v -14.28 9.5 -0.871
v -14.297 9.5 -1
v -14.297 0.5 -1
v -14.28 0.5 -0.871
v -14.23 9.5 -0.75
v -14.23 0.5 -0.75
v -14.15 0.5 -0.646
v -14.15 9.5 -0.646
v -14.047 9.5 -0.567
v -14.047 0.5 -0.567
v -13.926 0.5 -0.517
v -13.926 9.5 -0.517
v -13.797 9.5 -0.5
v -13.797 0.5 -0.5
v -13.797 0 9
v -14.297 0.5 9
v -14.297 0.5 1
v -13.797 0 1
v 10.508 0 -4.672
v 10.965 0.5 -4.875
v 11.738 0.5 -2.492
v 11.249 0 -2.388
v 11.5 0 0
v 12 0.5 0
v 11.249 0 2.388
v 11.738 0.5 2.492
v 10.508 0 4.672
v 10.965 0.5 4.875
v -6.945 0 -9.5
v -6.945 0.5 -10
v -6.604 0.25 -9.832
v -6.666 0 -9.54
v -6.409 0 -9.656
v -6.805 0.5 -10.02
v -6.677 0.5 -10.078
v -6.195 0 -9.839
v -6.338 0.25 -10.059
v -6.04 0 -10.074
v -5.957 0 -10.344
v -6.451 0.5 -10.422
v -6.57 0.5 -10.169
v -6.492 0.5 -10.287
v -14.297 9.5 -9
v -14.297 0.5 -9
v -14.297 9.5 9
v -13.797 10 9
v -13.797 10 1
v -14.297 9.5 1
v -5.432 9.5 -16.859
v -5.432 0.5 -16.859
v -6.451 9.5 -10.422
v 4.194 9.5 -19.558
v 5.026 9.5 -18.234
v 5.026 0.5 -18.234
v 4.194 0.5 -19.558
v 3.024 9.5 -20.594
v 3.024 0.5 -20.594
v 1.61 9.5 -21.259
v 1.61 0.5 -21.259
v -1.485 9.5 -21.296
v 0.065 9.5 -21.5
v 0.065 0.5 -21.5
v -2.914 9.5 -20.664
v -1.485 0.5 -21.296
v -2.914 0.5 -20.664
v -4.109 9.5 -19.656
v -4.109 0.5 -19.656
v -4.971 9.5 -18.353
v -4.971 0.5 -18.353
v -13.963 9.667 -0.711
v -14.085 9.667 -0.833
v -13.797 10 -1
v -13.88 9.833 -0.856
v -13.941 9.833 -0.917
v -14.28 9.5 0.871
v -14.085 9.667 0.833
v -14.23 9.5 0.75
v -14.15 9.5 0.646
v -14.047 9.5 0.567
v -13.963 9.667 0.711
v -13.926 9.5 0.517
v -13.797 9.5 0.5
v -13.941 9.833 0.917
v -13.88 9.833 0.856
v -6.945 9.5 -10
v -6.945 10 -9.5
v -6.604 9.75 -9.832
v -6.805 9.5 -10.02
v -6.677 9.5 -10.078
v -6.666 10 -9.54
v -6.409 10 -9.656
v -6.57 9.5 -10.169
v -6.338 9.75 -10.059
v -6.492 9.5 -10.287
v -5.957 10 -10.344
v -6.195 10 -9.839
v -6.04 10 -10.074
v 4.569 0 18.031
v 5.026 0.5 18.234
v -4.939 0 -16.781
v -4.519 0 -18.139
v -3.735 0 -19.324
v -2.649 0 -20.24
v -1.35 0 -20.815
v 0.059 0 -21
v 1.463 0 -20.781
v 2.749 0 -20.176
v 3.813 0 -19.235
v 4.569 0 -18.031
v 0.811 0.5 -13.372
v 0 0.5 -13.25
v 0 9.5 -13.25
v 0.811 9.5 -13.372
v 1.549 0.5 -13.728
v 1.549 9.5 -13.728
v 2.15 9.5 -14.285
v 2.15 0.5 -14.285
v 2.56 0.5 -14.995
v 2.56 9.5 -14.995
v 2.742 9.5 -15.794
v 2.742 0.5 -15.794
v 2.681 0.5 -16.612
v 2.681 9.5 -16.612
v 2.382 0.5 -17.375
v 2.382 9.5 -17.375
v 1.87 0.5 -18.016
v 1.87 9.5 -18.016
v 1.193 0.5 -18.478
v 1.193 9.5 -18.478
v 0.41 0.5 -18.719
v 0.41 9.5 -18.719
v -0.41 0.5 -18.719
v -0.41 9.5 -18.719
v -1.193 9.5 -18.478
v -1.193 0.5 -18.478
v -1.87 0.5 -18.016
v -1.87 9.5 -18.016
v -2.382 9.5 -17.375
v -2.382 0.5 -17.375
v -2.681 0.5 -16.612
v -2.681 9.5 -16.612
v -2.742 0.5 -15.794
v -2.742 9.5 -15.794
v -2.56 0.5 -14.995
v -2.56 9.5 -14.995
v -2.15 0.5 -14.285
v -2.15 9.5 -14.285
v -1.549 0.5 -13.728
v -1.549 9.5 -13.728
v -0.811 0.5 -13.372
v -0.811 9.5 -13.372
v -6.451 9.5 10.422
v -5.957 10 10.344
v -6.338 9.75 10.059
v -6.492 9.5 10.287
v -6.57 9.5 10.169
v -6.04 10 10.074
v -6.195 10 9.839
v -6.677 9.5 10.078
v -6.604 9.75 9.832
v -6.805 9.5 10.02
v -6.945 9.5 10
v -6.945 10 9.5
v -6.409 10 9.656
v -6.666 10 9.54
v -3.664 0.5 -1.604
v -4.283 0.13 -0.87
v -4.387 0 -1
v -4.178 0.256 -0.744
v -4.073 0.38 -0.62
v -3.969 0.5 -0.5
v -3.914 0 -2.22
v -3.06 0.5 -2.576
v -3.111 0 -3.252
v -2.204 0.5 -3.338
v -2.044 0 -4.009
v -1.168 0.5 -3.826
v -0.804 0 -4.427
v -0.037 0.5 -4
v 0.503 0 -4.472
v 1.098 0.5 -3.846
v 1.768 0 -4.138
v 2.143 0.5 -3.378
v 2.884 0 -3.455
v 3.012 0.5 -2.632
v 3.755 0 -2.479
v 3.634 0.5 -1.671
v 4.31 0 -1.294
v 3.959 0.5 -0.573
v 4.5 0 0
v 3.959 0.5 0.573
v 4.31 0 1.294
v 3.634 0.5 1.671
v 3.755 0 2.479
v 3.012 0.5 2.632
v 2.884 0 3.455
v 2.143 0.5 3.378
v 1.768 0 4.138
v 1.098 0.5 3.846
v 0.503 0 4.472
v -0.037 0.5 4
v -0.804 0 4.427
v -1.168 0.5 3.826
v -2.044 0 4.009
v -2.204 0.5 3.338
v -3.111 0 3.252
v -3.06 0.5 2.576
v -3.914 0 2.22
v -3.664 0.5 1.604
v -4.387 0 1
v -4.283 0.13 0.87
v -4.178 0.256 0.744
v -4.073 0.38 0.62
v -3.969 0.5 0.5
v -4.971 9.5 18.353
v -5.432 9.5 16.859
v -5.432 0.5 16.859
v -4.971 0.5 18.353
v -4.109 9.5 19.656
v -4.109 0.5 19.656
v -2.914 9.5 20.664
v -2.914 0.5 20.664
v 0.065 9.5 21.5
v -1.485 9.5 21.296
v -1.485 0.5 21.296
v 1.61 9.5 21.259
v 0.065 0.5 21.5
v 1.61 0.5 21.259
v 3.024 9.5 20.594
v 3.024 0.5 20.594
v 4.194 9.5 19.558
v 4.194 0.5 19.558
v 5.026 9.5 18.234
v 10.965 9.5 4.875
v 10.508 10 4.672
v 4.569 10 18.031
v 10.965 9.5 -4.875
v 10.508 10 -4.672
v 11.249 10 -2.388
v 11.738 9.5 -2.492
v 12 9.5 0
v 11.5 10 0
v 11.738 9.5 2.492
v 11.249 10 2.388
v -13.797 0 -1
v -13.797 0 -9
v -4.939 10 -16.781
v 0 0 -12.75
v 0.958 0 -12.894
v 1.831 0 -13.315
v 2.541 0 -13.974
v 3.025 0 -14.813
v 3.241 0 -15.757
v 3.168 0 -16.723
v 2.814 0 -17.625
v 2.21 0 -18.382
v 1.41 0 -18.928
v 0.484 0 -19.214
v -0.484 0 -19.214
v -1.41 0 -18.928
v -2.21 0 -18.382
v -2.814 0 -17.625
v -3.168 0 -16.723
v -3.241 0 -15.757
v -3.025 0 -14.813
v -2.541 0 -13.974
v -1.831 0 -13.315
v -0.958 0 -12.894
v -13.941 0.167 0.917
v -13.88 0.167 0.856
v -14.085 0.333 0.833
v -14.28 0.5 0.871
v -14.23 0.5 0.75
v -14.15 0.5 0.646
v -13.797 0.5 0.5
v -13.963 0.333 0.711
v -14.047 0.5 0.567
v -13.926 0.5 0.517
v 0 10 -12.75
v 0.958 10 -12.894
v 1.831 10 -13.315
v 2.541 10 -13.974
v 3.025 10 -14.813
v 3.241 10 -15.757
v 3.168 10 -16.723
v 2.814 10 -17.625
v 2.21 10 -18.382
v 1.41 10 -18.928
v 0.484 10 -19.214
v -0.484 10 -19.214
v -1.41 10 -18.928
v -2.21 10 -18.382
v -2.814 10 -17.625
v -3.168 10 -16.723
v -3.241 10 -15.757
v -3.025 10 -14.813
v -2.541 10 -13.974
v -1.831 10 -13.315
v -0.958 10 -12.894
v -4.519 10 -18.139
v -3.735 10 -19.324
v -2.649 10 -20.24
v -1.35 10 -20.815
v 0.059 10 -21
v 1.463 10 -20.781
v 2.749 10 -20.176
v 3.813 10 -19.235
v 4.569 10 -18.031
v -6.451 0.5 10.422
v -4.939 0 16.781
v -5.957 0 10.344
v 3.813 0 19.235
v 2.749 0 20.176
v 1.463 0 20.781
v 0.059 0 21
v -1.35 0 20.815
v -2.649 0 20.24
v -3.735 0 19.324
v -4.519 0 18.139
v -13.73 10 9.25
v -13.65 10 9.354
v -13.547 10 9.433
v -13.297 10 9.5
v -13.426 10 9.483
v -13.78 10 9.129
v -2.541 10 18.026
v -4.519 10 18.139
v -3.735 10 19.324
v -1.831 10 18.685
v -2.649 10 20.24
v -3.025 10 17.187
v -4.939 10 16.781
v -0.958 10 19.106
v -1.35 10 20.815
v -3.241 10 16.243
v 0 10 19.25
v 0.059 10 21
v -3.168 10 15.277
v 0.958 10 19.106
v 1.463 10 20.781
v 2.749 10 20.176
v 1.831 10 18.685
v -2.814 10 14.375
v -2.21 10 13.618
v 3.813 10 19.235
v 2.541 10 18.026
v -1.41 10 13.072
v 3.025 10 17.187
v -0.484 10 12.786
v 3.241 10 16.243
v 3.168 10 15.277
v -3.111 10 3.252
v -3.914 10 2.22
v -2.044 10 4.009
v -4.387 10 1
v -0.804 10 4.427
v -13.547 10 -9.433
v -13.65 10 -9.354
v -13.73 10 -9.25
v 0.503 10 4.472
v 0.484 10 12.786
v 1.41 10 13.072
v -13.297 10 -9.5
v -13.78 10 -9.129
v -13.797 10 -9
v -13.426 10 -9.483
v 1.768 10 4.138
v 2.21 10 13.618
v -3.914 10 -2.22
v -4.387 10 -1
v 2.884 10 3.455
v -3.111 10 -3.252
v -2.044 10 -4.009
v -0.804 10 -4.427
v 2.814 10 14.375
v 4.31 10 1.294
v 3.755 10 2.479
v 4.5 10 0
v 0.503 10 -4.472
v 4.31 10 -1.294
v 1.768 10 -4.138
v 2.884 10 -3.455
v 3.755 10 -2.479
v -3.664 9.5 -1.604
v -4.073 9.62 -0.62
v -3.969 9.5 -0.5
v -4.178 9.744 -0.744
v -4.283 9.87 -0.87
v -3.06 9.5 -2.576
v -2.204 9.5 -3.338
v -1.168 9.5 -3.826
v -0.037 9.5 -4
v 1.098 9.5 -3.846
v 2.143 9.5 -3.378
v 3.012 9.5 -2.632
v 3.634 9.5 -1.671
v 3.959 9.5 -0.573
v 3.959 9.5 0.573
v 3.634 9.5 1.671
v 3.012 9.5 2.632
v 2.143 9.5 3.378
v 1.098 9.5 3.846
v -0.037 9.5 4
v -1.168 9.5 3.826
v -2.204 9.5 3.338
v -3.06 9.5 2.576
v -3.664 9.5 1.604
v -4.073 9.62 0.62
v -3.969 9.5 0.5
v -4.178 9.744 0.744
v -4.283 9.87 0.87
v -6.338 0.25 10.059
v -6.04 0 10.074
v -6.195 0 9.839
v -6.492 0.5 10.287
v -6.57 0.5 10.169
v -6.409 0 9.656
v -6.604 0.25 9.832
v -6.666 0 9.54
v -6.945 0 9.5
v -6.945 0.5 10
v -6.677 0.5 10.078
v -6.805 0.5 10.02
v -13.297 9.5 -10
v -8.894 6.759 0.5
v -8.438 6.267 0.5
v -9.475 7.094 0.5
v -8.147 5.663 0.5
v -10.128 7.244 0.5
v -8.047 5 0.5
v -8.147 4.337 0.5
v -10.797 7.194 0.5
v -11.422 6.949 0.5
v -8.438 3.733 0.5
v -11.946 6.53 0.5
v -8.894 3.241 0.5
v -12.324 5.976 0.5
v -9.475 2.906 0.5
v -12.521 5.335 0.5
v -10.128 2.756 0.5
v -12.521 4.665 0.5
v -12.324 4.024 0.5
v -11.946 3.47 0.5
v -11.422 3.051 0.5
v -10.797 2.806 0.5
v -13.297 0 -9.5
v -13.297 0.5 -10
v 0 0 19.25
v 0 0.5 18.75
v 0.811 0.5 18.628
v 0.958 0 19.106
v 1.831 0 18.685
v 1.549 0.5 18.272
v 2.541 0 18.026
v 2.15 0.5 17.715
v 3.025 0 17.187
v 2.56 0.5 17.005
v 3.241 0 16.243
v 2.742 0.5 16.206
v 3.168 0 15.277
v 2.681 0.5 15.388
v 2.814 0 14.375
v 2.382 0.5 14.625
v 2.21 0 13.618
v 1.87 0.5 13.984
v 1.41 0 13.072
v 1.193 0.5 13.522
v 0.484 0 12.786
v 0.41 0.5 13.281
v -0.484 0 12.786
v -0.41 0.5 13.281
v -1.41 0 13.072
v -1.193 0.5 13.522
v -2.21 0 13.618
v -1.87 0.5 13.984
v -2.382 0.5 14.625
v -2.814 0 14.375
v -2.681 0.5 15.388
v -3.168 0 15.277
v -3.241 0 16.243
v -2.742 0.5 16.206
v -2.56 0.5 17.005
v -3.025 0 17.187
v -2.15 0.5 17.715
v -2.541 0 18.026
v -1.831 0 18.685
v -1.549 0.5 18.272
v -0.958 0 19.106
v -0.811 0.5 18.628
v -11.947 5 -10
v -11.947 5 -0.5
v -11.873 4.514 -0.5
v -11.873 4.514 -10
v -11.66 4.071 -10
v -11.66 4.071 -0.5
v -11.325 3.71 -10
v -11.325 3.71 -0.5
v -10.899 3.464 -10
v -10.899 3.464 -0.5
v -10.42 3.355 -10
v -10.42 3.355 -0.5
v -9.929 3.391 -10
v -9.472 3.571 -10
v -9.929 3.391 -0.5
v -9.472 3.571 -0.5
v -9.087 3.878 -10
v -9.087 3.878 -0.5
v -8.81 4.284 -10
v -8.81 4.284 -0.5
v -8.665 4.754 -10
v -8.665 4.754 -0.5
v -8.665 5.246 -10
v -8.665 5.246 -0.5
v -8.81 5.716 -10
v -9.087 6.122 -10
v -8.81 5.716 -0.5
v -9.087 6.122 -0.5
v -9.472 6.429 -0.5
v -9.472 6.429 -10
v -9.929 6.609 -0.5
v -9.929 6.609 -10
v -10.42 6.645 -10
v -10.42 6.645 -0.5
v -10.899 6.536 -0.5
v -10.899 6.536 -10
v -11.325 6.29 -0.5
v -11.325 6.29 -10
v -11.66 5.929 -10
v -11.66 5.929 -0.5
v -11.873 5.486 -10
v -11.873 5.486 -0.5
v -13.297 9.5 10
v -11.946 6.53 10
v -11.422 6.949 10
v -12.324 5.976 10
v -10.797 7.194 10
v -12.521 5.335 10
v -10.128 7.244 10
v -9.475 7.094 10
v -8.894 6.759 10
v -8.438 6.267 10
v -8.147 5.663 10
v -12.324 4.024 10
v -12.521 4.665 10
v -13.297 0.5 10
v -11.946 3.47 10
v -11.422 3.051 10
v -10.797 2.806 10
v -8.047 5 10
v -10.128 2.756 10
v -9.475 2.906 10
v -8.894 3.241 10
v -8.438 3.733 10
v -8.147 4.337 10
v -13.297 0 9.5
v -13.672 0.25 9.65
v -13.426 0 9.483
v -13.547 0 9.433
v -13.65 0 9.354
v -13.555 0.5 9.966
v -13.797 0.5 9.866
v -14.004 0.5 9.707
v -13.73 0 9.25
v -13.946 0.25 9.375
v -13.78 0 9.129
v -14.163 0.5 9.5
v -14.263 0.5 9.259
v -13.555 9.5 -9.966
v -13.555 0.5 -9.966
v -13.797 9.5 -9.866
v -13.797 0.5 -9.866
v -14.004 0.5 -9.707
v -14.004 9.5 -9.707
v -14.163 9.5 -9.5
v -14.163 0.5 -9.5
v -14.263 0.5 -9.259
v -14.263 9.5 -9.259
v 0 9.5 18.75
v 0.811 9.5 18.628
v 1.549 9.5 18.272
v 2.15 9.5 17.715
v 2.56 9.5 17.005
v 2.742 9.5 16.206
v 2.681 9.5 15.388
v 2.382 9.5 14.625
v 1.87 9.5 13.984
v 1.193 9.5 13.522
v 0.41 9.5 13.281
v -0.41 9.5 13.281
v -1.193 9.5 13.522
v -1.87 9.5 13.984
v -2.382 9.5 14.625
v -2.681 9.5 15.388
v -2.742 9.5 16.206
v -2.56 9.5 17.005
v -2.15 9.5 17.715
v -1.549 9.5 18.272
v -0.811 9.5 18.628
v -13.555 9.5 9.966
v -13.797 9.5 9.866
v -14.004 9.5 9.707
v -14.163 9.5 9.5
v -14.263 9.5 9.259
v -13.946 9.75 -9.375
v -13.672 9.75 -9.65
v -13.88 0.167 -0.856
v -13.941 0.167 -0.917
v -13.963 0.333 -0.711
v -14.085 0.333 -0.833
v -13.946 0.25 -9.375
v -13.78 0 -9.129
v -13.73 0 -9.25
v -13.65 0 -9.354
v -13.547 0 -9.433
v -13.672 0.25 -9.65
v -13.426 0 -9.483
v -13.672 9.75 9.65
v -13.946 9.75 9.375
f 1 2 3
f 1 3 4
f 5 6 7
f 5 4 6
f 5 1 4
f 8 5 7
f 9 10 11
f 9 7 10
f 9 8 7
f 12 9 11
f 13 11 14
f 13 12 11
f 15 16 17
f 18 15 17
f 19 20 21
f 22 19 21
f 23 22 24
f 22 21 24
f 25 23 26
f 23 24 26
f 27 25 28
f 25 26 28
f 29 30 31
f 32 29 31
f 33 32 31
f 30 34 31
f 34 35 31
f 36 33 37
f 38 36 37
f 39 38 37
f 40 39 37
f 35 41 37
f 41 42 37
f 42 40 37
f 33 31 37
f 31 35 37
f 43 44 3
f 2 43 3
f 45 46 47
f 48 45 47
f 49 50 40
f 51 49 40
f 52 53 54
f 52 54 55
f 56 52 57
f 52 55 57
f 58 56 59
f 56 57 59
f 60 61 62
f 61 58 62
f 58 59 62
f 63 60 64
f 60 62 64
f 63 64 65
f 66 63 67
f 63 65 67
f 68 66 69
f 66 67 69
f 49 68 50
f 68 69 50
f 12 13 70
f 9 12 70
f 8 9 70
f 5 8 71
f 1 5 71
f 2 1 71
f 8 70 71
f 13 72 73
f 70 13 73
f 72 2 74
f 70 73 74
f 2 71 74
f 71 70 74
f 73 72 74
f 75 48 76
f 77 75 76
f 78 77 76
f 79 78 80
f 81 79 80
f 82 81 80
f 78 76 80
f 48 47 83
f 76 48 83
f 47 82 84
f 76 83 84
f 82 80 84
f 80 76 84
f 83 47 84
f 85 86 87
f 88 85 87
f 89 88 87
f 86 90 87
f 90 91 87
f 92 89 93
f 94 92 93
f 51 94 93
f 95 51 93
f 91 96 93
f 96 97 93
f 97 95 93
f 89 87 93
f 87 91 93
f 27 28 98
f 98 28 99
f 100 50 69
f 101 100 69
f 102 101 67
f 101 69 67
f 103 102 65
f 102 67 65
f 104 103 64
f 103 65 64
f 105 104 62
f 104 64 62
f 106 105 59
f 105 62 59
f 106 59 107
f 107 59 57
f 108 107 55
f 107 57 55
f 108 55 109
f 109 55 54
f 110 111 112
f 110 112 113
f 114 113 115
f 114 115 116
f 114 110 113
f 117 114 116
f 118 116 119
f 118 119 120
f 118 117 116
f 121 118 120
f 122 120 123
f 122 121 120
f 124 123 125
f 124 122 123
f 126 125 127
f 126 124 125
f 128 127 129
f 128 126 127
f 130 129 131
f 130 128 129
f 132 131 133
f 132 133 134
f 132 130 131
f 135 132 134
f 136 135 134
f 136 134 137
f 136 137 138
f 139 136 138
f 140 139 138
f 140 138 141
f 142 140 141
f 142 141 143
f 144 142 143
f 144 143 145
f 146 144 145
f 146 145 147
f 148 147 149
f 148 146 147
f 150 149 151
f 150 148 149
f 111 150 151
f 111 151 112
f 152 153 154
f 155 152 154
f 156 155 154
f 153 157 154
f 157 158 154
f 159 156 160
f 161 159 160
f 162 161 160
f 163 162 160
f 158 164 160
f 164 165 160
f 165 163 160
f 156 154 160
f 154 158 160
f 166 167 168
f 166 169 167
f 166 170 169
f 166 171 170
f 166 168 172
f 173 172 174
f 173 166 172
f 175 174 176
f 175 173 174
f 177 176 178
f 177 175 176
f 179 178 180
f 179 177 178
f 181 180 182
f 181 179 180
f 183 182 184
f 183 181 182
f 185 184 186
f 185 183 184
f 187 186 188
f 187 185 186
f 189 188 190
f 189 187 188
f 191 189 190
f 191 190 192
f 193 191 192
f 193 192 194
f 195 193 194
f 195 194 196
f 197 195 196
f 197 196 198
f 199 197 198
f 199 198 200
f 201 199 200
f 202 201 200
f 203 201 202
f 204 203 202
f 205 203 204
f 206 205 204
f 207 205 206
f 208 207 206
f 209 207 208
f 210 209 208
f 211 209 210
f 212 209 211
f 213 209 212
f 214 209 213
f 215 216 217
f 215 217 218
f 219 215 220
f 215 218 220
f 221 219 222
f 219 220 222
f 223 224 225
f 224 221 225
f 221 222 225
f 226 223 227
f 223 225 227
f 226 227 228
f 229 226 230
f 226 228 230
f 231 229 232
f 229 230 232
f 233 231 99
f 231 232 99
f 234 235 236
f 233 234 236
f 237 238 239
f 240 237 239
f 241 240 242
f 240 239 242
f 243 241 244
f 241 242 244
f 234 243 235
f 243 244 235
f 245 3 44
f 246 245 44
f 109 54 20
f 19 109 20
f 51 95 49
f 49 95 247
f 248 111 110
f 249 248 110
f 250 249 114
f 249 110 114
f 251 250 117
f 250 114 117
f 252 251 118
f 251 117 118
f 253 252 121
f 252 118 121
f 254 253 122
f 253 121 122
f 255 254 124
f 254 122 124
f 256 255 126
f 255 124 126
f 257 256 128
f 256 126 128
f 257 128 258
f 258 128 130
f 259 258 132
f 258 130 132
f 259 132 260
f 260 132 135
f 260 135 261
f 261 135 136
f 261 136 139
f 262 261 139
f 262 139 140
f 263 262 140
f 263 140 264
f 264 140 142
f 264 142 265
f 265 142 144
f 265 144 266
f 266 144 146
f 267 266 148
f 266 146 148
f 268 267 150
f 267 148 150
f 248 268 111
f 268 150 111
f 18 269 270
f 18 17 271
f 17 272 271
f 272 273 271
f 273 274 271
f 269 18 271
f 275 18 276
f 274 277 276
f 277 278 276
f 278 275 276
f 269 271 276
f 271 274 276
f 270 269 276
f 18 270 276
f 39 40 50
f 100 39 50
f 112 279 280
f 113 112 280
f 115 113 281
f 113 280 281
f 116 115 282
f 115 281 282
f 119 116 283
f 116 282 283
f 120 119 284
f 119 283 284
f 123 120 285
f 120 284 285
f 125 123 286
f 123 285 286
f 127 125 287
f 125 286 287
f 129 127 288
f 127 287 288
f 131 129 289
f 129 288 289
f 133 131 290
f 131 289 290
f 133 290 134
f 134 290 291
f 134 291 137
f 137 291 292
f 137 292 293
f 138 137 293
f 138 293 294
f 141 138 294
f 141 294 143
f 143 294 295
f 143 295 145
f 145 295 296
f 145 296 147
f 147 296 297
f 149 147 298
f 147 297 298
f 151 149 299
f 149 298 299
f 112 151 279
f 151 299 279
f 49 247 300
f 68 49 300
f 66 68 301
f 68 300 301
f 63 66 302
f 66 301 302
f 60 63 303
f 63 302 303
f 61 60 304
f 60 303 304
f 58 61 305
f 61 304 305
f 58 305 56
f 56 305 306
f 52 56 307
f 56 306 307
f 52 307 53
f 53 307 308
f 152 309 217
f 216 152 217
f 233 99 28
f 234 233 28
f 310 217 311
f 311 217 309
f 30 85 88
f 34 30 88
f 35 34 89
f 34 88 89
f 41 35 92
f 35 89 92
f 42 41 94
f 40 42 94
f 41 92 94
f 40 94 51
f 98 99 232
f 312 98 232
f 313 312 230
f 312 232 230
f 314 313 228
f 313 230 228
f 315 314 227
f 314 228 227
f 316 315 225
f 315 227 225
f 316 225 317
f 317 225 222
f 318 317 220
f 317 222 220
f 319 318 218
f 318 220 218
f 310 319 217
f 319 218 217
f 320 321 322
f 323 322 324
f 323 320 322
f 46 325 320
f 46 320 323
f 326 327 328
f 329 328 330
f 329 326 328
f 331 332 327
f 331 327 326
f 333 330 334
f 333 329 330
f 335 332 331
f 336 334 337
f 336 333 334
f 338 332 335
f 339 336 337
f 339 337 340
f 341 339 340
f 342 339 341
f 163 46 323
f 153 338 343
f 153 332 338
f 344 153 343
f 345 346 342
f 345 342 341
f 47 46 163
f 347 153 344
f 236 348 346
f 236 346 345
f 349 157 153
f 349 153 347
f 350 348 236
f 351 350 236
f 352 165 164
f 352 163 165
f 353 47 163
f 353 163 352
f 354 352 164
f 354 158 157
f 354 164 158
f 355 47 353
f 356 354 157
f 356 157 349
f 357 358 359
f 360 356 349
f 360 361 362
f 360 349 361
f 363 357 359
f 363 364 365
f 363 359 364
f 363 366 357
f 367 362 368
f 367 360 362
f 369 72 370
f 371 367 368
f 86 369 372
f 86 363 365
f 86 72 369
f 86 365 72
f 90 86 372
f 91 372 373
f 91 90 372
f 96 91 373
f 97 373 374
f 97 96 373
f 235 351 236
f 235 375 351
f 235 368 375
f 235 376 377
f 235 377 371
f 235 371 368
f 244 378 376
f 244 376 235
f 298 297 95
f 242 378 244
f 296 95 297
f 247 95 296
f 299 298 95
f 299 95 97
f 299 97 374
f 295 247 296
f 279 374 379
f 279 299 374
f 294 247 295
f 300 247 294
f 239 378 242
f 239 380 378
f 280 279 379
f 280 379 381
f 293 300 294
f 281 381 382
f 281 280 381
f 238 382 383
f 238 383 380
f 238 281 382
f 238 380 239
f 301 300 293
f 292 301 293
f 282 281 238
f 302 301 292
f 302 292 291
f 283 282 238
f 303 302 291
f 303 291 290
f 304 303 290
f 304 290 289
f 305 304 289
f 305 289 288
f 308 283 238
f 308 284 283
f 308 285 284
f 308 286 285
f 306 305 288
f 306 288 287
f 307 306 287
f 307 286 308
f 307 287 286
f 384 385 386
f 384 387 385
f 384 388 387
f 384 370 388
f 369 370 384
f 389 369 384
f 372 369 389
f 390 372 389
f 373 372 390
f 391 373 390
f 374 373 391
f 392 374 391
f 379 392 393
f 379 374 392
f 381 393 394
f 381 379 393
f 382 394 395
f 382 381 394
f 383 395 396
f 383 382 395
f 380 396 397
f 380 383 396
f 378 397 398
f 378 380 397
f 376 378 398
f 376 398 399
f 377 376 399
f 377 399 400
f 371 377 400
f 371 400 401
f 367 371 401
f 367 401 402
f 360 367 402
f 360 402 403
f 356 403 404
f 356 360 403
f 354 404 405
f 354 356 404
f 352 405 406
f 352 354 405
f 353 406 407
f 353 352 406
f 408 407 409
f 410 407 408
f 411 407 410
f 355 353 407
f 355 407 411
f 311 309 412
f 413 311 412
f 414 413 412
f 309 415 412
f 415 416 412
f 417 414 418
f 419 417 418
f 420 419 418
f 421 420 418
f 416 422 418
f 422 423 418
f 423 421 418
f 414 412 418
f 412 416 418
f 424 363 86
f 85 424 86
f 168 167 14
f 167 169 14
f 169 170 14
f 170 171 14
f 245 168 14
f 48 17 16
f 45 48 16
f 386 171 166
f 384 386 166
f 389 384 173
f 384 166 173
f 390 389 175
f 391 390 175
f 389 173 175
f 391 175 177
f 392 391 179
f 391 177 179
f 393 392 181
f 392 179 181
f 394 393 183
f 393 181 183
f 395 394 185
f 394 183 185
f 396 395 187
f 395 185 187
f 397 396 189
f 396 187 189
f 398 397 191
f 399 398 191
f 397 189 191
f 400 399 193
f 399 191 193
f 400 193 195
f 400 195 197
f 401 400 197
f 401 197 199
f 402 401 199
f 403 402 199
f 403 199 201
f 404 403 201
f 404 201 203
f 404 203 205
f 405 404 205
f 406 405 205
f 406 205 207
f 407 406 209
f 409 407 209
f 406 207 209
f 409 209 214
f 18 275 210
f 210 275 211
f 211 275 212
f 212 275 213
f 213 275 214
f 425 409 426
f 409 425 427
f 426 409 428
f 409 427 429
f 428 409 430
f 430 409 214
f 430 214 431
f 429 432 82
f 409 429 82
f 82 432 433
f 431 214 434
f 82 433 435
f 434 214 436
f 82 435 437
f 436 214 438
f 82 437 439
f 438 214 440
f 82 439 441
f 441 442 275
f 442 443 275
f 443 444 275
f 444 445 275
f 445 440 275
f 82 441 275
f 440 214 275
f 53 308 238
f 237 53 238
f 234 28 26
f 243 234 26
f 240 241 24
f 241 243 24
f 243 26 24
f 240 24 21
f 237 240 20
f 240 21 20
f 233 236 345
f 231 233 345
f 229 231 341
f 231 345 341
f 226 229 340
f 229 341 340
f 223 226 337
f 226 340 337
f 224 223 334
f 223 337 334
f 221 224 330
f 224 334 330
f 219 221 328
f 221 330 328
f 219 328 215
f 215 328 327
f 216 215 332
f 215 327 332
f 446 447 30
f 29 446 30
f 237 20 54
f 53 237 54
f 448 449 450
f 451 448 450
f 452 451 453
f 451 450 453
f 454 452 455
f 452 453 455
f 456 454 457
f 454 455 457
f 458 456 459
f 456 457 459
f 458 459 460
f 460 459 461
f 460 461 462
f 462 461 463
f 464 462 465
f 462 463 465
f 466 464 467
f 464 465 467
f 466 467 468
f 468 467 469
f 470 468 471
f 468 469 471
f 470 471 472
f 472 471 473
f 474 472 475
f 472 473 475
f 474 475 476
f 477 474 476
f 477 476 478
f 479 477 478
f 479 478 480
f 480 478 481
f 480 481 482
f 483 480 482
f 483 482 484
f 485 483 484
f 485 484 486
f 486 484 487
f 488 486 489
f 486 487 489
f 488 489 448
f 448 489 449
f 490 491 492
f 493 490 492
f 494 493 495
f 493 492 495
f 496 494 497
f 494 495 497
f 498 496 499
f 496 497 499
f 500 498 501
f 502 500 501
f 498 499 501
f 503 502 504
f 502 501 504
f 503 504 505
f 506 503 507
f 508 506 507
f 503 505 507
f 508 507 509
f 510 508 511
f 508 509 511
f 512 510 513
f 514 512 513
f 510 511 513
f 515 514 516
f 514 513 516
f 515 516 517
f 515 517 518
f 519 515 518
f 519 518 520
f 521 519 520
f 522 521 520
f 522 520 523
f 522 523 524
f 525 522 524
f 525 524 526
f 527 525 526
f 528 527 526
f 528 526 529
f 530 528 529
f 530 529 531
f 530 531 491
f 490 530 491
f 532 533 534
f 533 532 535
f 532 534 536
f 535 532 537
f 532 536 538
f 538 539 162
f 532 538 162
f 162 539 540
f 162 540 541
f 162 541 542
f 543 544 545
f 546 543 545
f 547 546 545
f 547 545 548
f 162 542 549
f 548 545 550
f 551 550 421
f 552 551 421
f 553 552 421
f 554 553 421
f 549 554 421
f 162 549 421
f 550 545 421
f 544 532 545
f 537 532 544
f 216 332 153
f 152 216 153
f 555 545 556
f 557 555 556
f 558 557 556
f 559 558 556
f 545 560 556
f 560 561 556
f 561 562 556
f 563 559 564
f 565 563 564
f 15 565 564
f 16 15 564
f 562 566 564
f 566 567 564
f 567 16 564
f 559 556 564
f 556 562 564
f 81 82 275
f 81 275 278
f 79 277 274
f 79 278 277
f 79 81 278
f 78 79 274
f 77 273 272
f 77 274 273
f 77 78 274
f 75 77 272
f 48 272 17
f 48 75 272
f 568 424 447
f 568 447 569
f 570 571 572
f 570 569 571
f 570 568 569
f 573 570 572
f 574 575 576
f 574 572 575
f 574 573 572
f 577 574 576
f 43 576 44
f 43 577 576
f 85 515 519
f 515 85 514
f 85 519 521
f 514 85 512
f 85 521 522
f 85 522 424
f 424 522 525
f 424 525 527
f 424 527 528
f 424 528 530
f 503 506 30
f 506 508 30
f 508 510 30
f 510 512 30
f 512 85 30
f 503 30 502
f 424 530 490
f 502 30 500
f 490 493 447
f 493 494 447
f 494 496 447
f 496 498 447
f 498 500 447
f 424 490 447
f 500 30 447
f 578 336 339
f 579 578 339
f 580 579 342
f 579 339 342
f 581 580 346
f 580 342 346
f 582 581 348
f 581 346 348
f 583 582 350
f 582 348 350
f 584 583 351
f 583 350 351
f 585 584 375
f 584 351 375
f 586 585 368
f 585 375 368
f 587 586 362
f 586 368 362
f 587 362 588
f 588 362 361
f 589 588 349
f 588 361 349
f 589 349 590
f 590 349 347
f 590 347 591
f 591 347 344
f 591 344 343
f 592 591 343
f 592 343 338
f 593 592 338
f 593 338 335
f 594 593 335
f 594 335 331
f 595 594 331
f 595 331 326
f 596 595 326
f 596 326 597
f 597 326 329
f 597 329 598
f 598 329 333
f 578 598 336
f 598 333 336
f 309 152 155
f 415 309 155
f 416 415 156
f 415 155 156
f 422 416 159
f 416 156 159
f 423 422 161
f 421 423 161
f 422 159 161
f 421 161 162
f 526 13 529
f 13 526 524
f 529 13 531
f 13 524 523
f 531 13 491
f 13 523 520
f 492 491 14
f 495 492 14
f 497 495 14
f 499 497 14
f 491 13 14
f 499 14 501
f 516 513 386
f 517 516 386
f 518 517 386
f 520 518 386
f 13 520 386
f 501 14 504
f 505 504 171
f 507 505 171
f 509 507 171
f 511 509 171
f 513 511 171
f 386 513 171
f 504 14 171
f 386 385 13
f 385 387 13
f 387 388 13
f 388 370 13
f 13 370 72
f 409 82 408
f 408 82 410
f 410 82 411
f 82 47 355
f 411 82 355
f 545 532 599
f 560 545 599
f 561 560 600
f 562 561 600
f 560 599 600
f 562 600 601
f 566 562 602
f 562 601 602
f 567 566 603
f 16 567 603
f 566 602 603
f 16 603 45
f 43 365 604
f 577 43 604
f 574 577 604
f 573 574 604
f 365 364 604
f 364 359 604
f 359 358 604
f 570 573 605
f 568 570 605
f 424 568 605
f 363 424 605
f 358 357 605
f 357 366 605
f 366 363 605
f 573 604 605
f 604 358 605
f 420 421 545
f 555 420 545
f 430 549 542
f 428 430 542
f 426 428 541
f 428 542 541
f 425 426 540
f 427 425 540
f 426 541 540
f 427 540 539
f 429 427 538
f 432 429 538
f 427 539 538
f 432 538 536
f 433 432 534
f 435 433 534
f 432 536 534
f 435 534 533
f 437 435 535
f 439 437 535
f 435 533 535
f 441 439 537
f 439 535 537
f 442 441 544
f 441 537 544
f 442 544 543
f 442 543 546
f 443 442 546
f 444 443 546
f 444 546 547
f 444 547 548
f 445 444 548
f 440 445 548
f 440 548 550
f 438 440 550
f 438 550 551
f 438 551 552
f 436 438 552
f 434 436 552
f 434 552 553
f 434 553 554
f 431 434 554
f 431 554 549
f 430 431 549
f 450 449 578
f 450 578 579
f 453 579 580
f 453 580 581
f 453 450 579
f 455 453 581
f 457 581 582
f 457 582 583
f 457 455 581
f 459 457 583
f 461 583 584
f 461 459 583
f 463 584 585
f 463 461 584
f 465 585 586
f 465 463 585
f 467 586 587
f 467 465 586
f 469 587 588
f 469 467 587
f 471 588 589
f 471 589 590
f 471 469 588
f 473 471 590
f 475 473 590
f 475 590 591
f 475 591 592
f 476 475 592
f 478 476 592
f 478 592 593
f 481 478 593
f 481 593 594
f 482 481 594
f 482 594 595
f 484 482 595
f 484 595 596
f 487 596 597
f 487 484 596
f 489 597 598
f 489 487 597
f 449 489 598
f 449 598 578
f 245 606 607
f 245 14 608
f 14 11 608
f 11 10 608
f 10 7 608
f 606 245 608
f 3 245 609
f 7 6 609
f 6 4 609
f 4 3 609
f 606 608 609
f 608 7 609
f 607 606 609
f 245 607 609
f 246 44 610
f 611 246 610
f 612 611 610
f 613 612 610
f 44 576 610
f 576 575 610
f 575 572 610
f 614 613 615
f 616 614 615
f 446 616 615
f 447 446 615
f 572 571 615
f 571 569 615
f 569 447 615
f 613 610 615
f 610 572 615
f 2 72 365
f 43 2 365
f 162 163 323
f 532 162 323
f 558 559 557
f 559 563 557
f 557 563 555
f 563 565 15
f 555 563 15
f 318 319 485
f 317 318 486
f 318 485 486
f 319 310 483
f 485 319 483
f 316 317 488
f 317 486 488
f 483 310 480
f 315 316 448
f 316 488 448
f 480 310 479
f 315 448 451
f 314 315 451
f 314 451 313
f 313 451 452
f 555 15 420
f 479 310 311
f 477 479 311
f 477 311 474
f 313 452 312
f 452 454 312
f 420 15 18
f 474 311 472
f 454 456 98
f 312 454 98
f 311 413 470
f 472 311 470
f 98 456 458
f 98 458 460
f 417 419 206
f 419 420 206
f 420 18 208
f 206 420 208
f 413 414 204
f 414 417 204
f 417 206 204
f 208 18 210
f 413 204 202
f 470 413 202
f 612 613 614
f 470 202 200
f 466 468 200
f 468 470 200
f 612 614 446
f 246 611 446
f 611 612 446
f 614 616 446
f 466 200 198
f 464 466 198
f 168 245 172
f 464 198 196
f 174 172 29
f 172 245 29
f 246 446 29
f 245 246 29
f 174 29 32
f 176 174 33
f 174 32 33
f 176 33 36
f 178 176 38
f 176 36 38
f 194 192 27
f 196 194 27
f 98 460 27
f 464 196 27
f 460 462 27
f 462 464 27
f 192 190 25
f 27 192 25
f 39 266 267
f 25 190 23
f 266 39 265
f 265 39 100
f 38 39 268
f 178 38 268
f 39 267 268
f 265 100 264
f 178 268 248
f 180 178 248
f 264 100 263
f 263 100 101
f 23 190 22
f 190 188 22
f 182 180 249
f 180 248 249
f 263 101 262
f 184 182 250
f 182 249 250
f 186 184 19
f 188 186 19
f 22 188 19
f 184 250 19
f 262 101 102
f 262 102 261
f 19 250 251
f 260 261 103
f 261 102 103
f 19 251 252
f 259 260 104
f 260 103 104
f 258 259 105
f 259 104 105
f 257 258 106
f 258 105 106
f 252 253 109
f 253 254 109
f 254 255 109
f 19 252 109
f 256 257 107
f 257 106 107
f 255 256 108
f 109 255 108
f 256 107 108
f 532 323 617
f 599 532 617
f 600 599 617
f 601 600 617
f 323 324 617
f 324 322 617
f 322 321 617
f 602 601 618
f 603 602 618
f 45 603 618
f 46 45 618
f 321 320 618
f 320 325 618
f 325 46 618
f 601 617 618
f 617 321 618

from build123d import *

# Parameters (mm, degrees)
SKETCH_1_R          = 2.75
EXTRUDE_1_DEPTH     = 10
CUT_EXTRUDE_1_REACH = 38.009
SKETCH_3_R          = 2.25
SKETCH_3_3_R        = 1.65
CUT_EXTRUDE_2_DEPTH = 37.00893353
FILLET_1_R          = 1
FILLET_2_R          = 0.5
CHAMFER_1_SIZE      = 0.5


with BuildPart() as part:
    # 草图1 → 凸台-拉伸1 (new body)
    with BuildSketch(Plane(origin=(0, 0, 0), x_dir=(1, 0, 0), z_dir=(0, 1, 0))):
        with BuildLine():
            ThreePointArc((5.025690834, 18.234375), (-0.716951035, 21.453070806), (-5.432446466, 16.859375))
            Line((-5.432446466, 16.859375), (-6.517551571, 10))
            Line((-6.517551571, 10), (-14.296618271, 10))
            Line((-14.296618271, 10), (-14.296618271, 0.5))
            Line((-14.296618271, 0.5), (-3.968626967, 0.5))
            ThreePointArc((-3.968626967, 0.5), (4, 0), (-3.968626967, -0.5))
            Line((-3.968626967, -0.5), (-14.296618271, -0.5))
            Line((-14.296618271, -0.5), (-14.296618271, -10))
            Line((-14.296618271, -10), (-6.517551571, -10))
            Line((-6.517551571, -10), (-5.432446466, -16.859375))
            ThreePointArc((-5.432446466, -16.859375), (-0.716951035, -21.453070806), (5.025690834, -18.234375))
            Line((5.025690834, -18.234375), (10.965143638, -4.875))
            ThreePointArc((10.965143638, -4.875), (12, 0), (10.965143638, 4.875))
            Line((10.965143638, 4.875), (5.025690834, 18.234375))
        make_face()
        with Locations(Location((0, -16, 0), (0, 0, 270))):
            Circle(SKETCH_1_R, mode=Mode.SUBTRACT)
        with Locations(Location((0, 16, 0), (0, 0, 270))):
            Circle(SKETCH_1_R, mode=Mode.SUBTRACT)
    extrude(amount=EXTRUDE_1_DEPTH)

    # 草图3 → 切除-拉伸1 (cut, up to next)
    with BuildSketch(Plane.XY.offset(10), mode=Mode.PRIVATE) as cut_extrude_1_sk1:
        with Locations((-10.296618271, 5)):
            Circle(SKETCH_3_R)
    cut_extrude_1_tool1 = extrude(cut_extrude_1_sk1.sketch, amount=-CUT_EXTRUDE_1_REACH, mode=Mode.PRIVATE) & part.part
    add(cut_extrude_1_tool1.solids().sort_by_distance((-10.296618, 5, 10))[0], mode=Mode.SUBTRACT)

    # 草图3<3> → 切除-拉伸2 (cut, through all)
    with BuildSketch(Plane.XY.offset(10)):
        with Locations(Location((-10.296618271, 5, 0), (0, 0, 180))):
            Circle(SKETCH_3_3_R)
    extrude(amount=-CUT_EXTRUDE_2_DEPTH, mode=Mode.SUBTRACT)

    # 圆角1
    fillet_1_edges = [part.edges().sort_by_distance(p)[0] for p in [
        (-14.296618271, 5, 10),
        (-14.296618271, 5, -10),
    ]]
    fillet(fillet_1_edges, radius=FILLET_1_R)

    # 圆角2
    fillet_2_edges = [part.edges().sort_by_distance(p)[0] for p in [
        (-6.517551571, 5, 10),
        (-14.296618271, 5, 0.5),
        (-14.296618271, 5, -0.5),
        (-6.517551571, 5, -10),
    ]]
    fillet(fillet_2_edges, radius=FILLET_2_R)

    # 倒角1
    chamfer_1_edges = [part.edges().sort_by_distance(p)[0] for p in [
        (-6.619913143, 0, 10.119827342),
        (-6.619913143, 10, 10.119827342),
        (-6.619913143, 0, -10.119827342),
        (-6.619913143, 10, -10.119827342),
        (-0.716951035, 10, 21.453070806),
        (7.995417236, 10, 11.5546875),
        (0, 0, 13.25),
        (0, 0, -18.75),
        (4, 0, 0),
        (12, 10, 0),
        (-5.941630183, 0, -13.640625),
        (-0.716951035, 0, -21.453070806),
        (7.995417236, 0, -11.5546875),
        (12, 0, 0),
        (7.995417236, 0, 11.5546875),
        (-0.716951035, 0, 21.453070806),
        (-5.941630183, 0, 13.640625),
        (7.995417236, 10, -11.5546875),
        (-0.716951035, 10, -21.453070806),
        (-5.941630183, 10, -13.640625),
        (4, 10, 0),
        (-14.296618271, 0, -5),
        (-14.296618271, 10, -5),
        (-10.12064547, 0, 10),
        (-10.12064547, 0, -10),
        (-14.003725052, 0, 9.707106781),
        (-14.003725052, 0, -9.707106781),
        (-10.12064547, 10, -10),
        (-5.941630183, 10, 13.640625),
        (-10.12064547, 10, 10),
        (-14.003725052, 10, 9.707106781),
        (-14.003725052, 10, -9.707106781),
        (0, 10, -18.75),
        (-8.882622619, 0, -0.5),
        (-8.882622619, 10, -0.5),
        (0, 10, 13.25),
        (-14.296618271, 0, 5),
        (-8.882622619, 0, 0.5),
        (-14.150171662, 0, 0.646446609),
        (-14.150171662, 0, -0.646446609),
        (-8.882622619, 10, 0.5),
        (-14.296618271, 10, 5),
        (-14.150171662, 10, 0.646446609),
        (-14.150171662, 10, -0.646446609),
    ]]
    chamfer(chamfer_1_edges, length=CHAMFER_1_SIZE - 0.0001)  # a hair under: the kernel refuses the full size


solid = part.part
